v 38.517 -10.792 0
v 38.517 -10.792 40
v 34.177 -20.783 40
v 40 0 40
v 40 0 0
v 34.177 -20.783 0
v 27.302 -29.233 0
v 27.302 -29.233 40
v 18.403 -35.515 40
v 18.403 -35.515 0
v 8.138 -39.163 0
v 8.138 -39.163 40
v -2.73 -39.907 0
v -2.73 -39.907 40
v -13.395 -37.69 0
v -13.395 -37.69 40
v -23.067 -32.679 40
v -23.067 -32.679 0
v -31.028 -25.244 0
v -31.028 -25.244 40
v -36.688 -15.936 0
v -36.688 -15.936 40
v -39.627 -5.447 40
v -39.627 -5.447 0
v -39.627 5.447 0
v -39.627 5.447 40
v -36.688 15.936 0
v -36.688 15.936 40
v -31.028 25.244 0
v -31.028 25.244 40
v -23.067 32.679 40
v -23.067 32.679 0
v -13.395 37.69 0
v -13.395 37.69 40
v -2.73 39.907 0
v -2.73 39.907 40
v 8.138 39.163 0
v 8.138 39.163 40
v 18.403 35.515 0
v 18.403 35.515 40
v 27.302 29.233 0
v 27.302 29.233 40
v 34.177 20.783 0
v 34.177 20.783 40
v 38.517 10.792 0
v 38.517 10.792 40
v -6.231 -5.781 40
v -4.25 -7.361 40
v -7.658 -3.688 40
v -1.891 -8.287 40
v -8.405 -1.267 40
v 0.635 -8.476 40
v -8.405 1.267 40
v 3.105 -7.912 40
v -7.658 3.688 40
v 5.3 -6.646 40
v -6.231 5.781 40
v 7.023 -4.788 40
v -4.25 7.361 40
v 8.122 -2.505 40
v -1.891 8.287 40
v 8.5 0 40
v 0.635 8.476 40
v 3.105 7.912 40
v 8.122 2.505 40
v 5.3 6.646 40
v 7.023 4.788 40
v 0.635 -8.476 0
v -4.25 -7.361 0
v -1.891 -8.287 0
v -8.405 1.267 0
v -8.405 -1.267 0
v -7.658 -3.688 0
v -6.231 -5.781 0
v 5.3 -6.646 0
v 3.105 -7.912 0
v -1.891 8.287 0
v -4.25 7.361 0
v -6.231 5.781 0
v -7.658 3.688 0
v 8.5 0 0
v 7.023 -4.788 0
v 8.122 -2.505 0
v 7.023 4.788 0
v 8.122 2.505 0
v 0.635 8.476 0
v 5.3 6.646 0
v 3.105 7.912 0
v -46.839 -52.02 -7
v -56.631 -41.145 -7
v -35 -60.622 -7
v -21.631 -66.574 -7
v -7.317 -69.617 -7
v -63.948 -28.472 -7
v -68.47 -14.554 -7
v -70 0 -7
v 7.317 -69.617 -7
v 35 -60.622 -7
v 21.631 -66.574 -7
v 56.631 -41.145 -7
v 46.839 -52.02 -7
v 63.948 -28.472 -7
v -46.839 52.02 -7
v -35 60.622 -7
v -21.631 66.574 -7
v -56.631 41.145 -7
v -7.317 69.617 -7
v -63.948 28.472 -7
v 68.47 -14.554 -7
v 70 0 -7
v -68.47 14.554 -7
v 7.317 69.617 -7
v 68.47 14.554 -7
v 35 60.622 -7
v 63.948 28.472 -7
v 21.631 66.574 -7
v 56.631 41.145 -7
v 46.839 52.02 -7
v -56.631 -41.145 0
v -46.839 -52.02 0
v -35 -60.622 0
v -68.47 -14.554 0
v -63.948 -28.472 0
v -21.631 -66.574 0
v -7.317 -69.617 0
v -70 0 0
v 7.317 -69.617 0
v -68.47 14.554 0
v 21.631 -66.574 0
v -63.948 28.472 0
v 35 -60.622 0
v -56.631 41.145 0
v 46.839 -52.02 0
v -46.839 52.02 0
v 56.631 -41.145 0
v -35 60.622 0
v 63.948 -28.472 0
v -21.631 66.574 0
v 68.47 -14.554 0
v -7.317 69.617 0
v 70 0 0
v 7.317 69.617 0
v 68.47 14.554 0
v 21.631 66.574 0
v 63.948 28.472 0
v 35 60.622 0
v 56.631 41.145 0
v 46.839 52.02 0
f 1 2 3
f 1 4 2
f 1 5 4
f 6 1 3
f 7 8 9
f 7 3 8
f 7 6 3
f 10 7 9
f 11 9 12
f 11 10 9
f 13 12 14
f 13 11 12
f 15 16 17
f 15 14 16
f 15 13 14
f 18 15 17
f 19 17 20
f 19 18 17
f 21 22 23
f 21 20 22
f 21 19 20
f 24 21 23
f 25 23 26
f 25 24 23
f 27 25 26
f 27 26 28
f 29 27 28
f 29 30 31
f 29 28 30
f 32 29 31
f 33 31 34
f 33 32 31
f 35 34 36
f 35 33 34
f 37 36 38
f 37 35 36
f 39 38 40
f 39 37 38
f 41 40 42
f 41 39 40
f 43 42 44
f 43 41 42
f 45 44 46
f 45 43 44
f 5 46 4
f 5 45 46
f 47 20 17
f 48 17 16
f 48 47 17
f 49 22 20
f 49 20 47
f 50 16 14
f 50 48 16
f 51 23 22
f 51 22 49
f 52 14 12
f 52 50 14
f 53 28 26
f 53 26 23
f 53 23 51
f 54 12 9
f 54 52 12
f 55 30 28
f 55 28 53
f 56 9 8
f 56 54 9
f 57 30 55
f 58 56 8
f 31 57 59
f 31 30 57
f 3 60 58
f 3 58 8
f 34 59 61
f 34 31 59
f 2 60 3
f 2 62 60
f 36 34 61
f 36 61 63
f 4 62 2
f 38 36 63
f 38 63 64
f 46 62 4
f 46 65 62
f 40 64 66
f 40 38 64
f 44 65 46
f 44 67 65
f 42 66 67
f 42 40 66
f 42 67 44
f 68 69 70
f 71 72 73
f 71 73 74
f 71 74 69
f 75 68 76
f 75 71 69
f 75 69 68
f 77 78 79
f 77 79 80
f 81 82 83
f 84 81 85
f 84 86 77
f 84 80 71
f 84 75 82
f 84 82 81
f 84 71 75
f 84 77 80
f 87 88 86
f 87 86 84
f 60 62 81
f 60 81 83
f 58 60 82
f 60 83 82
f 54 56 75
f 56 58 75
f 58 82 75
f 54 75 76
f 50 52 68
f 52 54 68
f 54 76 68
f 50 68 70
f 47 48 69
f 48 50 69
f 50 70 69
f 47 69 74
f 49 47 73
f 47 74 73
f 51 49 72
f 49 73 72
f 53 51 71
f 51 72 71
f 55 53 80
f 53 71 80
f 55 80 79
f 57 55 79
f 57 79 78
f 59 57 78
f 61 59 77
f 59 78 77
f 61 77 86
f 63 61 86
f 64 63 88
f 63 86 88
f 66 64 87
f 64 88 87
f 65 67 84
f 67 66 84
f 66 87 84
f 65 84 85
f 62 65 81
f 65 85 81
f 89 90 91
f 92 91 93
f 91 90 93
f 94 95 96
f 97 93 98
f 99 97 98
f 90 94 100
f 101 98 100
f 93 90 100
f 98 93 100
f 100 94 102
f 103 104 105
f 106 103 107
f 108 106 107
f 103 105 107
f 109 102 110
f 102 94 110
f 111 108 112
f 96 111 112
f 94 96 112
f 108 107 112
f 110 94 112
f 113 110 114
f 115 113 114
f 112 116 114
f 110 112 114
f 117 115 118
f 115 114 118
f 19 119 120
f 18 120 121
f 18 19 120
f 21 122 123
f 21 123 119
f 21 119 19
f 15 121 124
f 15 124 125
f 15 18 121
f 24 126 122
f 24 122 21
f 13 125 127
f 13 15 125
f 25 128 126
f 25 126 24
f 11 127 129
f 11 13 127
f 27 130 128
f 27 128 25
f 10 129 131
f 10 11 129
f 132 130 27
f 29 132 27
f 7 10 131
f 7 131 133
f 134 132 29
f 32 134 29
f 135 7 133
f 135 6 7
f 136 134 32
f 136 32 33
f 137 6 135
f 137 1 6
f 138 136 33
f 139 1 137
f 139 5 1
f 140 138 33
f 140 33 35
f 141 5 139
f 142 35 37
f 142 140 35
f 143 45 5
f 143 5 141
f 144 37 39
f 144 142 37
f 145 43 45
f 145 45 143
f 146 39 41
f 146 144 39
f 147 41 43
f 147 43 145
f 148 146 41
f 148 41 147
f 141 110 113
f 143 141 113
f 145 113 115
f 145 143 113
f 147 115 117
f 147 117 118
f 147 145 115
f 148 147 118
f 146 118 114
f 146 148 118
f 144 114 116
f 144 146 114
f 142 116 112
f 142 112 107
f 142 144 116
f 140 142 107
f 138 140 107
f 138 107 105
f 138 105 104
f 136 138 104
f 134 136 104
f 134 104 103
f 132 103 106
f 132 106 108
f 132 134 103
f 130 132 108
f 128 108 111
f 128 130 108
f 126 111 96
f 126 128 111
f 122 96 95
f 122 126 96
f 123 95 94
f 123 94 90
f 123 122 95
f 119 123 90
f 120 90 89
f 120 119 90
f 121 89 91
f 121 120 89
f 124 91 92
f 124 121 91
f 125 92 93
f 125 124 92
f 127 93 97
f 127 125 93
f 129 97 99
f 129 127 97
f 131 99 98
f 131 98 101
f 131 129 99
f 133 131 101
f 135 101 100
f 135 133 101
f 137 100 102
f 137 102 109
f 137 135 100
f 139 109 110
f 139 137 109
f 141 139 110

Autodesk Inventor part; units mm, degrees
ref_plane "YZ Plane" through (0, 0, 0) normal (1, 0, 0) x (0, 1, 0)
ref_plane "XZ Plane" through (0, 0, 0) normal (0, 1, 0) x (-1, 0, 0)
ref_plane "XY Plane" through (0, 0, 0) normal (0, 0, 1) x (1, 0, 0)
sketch "Sketch1" plane through (0, 0, 0) normal (0, 0, 1) x (1, 0, 0)
  circle A0 centre (0, 0) radius 70
  circle A1 centre (0, 0) radius 8.5
  circle A2 centre (0, 0) radius 40
  dimension "d0" = 140
  dimension "d1" = 17
  dimension "d2" = 80
extrude "Extrusion1" add sketch "Sketch1" against normal blind 7 contours A0 | A1 | A2
extrude "Extrusion2" add sketch "Sketch1" along normal blind 40 contours A2
properties part number "47T-Sprocket"
